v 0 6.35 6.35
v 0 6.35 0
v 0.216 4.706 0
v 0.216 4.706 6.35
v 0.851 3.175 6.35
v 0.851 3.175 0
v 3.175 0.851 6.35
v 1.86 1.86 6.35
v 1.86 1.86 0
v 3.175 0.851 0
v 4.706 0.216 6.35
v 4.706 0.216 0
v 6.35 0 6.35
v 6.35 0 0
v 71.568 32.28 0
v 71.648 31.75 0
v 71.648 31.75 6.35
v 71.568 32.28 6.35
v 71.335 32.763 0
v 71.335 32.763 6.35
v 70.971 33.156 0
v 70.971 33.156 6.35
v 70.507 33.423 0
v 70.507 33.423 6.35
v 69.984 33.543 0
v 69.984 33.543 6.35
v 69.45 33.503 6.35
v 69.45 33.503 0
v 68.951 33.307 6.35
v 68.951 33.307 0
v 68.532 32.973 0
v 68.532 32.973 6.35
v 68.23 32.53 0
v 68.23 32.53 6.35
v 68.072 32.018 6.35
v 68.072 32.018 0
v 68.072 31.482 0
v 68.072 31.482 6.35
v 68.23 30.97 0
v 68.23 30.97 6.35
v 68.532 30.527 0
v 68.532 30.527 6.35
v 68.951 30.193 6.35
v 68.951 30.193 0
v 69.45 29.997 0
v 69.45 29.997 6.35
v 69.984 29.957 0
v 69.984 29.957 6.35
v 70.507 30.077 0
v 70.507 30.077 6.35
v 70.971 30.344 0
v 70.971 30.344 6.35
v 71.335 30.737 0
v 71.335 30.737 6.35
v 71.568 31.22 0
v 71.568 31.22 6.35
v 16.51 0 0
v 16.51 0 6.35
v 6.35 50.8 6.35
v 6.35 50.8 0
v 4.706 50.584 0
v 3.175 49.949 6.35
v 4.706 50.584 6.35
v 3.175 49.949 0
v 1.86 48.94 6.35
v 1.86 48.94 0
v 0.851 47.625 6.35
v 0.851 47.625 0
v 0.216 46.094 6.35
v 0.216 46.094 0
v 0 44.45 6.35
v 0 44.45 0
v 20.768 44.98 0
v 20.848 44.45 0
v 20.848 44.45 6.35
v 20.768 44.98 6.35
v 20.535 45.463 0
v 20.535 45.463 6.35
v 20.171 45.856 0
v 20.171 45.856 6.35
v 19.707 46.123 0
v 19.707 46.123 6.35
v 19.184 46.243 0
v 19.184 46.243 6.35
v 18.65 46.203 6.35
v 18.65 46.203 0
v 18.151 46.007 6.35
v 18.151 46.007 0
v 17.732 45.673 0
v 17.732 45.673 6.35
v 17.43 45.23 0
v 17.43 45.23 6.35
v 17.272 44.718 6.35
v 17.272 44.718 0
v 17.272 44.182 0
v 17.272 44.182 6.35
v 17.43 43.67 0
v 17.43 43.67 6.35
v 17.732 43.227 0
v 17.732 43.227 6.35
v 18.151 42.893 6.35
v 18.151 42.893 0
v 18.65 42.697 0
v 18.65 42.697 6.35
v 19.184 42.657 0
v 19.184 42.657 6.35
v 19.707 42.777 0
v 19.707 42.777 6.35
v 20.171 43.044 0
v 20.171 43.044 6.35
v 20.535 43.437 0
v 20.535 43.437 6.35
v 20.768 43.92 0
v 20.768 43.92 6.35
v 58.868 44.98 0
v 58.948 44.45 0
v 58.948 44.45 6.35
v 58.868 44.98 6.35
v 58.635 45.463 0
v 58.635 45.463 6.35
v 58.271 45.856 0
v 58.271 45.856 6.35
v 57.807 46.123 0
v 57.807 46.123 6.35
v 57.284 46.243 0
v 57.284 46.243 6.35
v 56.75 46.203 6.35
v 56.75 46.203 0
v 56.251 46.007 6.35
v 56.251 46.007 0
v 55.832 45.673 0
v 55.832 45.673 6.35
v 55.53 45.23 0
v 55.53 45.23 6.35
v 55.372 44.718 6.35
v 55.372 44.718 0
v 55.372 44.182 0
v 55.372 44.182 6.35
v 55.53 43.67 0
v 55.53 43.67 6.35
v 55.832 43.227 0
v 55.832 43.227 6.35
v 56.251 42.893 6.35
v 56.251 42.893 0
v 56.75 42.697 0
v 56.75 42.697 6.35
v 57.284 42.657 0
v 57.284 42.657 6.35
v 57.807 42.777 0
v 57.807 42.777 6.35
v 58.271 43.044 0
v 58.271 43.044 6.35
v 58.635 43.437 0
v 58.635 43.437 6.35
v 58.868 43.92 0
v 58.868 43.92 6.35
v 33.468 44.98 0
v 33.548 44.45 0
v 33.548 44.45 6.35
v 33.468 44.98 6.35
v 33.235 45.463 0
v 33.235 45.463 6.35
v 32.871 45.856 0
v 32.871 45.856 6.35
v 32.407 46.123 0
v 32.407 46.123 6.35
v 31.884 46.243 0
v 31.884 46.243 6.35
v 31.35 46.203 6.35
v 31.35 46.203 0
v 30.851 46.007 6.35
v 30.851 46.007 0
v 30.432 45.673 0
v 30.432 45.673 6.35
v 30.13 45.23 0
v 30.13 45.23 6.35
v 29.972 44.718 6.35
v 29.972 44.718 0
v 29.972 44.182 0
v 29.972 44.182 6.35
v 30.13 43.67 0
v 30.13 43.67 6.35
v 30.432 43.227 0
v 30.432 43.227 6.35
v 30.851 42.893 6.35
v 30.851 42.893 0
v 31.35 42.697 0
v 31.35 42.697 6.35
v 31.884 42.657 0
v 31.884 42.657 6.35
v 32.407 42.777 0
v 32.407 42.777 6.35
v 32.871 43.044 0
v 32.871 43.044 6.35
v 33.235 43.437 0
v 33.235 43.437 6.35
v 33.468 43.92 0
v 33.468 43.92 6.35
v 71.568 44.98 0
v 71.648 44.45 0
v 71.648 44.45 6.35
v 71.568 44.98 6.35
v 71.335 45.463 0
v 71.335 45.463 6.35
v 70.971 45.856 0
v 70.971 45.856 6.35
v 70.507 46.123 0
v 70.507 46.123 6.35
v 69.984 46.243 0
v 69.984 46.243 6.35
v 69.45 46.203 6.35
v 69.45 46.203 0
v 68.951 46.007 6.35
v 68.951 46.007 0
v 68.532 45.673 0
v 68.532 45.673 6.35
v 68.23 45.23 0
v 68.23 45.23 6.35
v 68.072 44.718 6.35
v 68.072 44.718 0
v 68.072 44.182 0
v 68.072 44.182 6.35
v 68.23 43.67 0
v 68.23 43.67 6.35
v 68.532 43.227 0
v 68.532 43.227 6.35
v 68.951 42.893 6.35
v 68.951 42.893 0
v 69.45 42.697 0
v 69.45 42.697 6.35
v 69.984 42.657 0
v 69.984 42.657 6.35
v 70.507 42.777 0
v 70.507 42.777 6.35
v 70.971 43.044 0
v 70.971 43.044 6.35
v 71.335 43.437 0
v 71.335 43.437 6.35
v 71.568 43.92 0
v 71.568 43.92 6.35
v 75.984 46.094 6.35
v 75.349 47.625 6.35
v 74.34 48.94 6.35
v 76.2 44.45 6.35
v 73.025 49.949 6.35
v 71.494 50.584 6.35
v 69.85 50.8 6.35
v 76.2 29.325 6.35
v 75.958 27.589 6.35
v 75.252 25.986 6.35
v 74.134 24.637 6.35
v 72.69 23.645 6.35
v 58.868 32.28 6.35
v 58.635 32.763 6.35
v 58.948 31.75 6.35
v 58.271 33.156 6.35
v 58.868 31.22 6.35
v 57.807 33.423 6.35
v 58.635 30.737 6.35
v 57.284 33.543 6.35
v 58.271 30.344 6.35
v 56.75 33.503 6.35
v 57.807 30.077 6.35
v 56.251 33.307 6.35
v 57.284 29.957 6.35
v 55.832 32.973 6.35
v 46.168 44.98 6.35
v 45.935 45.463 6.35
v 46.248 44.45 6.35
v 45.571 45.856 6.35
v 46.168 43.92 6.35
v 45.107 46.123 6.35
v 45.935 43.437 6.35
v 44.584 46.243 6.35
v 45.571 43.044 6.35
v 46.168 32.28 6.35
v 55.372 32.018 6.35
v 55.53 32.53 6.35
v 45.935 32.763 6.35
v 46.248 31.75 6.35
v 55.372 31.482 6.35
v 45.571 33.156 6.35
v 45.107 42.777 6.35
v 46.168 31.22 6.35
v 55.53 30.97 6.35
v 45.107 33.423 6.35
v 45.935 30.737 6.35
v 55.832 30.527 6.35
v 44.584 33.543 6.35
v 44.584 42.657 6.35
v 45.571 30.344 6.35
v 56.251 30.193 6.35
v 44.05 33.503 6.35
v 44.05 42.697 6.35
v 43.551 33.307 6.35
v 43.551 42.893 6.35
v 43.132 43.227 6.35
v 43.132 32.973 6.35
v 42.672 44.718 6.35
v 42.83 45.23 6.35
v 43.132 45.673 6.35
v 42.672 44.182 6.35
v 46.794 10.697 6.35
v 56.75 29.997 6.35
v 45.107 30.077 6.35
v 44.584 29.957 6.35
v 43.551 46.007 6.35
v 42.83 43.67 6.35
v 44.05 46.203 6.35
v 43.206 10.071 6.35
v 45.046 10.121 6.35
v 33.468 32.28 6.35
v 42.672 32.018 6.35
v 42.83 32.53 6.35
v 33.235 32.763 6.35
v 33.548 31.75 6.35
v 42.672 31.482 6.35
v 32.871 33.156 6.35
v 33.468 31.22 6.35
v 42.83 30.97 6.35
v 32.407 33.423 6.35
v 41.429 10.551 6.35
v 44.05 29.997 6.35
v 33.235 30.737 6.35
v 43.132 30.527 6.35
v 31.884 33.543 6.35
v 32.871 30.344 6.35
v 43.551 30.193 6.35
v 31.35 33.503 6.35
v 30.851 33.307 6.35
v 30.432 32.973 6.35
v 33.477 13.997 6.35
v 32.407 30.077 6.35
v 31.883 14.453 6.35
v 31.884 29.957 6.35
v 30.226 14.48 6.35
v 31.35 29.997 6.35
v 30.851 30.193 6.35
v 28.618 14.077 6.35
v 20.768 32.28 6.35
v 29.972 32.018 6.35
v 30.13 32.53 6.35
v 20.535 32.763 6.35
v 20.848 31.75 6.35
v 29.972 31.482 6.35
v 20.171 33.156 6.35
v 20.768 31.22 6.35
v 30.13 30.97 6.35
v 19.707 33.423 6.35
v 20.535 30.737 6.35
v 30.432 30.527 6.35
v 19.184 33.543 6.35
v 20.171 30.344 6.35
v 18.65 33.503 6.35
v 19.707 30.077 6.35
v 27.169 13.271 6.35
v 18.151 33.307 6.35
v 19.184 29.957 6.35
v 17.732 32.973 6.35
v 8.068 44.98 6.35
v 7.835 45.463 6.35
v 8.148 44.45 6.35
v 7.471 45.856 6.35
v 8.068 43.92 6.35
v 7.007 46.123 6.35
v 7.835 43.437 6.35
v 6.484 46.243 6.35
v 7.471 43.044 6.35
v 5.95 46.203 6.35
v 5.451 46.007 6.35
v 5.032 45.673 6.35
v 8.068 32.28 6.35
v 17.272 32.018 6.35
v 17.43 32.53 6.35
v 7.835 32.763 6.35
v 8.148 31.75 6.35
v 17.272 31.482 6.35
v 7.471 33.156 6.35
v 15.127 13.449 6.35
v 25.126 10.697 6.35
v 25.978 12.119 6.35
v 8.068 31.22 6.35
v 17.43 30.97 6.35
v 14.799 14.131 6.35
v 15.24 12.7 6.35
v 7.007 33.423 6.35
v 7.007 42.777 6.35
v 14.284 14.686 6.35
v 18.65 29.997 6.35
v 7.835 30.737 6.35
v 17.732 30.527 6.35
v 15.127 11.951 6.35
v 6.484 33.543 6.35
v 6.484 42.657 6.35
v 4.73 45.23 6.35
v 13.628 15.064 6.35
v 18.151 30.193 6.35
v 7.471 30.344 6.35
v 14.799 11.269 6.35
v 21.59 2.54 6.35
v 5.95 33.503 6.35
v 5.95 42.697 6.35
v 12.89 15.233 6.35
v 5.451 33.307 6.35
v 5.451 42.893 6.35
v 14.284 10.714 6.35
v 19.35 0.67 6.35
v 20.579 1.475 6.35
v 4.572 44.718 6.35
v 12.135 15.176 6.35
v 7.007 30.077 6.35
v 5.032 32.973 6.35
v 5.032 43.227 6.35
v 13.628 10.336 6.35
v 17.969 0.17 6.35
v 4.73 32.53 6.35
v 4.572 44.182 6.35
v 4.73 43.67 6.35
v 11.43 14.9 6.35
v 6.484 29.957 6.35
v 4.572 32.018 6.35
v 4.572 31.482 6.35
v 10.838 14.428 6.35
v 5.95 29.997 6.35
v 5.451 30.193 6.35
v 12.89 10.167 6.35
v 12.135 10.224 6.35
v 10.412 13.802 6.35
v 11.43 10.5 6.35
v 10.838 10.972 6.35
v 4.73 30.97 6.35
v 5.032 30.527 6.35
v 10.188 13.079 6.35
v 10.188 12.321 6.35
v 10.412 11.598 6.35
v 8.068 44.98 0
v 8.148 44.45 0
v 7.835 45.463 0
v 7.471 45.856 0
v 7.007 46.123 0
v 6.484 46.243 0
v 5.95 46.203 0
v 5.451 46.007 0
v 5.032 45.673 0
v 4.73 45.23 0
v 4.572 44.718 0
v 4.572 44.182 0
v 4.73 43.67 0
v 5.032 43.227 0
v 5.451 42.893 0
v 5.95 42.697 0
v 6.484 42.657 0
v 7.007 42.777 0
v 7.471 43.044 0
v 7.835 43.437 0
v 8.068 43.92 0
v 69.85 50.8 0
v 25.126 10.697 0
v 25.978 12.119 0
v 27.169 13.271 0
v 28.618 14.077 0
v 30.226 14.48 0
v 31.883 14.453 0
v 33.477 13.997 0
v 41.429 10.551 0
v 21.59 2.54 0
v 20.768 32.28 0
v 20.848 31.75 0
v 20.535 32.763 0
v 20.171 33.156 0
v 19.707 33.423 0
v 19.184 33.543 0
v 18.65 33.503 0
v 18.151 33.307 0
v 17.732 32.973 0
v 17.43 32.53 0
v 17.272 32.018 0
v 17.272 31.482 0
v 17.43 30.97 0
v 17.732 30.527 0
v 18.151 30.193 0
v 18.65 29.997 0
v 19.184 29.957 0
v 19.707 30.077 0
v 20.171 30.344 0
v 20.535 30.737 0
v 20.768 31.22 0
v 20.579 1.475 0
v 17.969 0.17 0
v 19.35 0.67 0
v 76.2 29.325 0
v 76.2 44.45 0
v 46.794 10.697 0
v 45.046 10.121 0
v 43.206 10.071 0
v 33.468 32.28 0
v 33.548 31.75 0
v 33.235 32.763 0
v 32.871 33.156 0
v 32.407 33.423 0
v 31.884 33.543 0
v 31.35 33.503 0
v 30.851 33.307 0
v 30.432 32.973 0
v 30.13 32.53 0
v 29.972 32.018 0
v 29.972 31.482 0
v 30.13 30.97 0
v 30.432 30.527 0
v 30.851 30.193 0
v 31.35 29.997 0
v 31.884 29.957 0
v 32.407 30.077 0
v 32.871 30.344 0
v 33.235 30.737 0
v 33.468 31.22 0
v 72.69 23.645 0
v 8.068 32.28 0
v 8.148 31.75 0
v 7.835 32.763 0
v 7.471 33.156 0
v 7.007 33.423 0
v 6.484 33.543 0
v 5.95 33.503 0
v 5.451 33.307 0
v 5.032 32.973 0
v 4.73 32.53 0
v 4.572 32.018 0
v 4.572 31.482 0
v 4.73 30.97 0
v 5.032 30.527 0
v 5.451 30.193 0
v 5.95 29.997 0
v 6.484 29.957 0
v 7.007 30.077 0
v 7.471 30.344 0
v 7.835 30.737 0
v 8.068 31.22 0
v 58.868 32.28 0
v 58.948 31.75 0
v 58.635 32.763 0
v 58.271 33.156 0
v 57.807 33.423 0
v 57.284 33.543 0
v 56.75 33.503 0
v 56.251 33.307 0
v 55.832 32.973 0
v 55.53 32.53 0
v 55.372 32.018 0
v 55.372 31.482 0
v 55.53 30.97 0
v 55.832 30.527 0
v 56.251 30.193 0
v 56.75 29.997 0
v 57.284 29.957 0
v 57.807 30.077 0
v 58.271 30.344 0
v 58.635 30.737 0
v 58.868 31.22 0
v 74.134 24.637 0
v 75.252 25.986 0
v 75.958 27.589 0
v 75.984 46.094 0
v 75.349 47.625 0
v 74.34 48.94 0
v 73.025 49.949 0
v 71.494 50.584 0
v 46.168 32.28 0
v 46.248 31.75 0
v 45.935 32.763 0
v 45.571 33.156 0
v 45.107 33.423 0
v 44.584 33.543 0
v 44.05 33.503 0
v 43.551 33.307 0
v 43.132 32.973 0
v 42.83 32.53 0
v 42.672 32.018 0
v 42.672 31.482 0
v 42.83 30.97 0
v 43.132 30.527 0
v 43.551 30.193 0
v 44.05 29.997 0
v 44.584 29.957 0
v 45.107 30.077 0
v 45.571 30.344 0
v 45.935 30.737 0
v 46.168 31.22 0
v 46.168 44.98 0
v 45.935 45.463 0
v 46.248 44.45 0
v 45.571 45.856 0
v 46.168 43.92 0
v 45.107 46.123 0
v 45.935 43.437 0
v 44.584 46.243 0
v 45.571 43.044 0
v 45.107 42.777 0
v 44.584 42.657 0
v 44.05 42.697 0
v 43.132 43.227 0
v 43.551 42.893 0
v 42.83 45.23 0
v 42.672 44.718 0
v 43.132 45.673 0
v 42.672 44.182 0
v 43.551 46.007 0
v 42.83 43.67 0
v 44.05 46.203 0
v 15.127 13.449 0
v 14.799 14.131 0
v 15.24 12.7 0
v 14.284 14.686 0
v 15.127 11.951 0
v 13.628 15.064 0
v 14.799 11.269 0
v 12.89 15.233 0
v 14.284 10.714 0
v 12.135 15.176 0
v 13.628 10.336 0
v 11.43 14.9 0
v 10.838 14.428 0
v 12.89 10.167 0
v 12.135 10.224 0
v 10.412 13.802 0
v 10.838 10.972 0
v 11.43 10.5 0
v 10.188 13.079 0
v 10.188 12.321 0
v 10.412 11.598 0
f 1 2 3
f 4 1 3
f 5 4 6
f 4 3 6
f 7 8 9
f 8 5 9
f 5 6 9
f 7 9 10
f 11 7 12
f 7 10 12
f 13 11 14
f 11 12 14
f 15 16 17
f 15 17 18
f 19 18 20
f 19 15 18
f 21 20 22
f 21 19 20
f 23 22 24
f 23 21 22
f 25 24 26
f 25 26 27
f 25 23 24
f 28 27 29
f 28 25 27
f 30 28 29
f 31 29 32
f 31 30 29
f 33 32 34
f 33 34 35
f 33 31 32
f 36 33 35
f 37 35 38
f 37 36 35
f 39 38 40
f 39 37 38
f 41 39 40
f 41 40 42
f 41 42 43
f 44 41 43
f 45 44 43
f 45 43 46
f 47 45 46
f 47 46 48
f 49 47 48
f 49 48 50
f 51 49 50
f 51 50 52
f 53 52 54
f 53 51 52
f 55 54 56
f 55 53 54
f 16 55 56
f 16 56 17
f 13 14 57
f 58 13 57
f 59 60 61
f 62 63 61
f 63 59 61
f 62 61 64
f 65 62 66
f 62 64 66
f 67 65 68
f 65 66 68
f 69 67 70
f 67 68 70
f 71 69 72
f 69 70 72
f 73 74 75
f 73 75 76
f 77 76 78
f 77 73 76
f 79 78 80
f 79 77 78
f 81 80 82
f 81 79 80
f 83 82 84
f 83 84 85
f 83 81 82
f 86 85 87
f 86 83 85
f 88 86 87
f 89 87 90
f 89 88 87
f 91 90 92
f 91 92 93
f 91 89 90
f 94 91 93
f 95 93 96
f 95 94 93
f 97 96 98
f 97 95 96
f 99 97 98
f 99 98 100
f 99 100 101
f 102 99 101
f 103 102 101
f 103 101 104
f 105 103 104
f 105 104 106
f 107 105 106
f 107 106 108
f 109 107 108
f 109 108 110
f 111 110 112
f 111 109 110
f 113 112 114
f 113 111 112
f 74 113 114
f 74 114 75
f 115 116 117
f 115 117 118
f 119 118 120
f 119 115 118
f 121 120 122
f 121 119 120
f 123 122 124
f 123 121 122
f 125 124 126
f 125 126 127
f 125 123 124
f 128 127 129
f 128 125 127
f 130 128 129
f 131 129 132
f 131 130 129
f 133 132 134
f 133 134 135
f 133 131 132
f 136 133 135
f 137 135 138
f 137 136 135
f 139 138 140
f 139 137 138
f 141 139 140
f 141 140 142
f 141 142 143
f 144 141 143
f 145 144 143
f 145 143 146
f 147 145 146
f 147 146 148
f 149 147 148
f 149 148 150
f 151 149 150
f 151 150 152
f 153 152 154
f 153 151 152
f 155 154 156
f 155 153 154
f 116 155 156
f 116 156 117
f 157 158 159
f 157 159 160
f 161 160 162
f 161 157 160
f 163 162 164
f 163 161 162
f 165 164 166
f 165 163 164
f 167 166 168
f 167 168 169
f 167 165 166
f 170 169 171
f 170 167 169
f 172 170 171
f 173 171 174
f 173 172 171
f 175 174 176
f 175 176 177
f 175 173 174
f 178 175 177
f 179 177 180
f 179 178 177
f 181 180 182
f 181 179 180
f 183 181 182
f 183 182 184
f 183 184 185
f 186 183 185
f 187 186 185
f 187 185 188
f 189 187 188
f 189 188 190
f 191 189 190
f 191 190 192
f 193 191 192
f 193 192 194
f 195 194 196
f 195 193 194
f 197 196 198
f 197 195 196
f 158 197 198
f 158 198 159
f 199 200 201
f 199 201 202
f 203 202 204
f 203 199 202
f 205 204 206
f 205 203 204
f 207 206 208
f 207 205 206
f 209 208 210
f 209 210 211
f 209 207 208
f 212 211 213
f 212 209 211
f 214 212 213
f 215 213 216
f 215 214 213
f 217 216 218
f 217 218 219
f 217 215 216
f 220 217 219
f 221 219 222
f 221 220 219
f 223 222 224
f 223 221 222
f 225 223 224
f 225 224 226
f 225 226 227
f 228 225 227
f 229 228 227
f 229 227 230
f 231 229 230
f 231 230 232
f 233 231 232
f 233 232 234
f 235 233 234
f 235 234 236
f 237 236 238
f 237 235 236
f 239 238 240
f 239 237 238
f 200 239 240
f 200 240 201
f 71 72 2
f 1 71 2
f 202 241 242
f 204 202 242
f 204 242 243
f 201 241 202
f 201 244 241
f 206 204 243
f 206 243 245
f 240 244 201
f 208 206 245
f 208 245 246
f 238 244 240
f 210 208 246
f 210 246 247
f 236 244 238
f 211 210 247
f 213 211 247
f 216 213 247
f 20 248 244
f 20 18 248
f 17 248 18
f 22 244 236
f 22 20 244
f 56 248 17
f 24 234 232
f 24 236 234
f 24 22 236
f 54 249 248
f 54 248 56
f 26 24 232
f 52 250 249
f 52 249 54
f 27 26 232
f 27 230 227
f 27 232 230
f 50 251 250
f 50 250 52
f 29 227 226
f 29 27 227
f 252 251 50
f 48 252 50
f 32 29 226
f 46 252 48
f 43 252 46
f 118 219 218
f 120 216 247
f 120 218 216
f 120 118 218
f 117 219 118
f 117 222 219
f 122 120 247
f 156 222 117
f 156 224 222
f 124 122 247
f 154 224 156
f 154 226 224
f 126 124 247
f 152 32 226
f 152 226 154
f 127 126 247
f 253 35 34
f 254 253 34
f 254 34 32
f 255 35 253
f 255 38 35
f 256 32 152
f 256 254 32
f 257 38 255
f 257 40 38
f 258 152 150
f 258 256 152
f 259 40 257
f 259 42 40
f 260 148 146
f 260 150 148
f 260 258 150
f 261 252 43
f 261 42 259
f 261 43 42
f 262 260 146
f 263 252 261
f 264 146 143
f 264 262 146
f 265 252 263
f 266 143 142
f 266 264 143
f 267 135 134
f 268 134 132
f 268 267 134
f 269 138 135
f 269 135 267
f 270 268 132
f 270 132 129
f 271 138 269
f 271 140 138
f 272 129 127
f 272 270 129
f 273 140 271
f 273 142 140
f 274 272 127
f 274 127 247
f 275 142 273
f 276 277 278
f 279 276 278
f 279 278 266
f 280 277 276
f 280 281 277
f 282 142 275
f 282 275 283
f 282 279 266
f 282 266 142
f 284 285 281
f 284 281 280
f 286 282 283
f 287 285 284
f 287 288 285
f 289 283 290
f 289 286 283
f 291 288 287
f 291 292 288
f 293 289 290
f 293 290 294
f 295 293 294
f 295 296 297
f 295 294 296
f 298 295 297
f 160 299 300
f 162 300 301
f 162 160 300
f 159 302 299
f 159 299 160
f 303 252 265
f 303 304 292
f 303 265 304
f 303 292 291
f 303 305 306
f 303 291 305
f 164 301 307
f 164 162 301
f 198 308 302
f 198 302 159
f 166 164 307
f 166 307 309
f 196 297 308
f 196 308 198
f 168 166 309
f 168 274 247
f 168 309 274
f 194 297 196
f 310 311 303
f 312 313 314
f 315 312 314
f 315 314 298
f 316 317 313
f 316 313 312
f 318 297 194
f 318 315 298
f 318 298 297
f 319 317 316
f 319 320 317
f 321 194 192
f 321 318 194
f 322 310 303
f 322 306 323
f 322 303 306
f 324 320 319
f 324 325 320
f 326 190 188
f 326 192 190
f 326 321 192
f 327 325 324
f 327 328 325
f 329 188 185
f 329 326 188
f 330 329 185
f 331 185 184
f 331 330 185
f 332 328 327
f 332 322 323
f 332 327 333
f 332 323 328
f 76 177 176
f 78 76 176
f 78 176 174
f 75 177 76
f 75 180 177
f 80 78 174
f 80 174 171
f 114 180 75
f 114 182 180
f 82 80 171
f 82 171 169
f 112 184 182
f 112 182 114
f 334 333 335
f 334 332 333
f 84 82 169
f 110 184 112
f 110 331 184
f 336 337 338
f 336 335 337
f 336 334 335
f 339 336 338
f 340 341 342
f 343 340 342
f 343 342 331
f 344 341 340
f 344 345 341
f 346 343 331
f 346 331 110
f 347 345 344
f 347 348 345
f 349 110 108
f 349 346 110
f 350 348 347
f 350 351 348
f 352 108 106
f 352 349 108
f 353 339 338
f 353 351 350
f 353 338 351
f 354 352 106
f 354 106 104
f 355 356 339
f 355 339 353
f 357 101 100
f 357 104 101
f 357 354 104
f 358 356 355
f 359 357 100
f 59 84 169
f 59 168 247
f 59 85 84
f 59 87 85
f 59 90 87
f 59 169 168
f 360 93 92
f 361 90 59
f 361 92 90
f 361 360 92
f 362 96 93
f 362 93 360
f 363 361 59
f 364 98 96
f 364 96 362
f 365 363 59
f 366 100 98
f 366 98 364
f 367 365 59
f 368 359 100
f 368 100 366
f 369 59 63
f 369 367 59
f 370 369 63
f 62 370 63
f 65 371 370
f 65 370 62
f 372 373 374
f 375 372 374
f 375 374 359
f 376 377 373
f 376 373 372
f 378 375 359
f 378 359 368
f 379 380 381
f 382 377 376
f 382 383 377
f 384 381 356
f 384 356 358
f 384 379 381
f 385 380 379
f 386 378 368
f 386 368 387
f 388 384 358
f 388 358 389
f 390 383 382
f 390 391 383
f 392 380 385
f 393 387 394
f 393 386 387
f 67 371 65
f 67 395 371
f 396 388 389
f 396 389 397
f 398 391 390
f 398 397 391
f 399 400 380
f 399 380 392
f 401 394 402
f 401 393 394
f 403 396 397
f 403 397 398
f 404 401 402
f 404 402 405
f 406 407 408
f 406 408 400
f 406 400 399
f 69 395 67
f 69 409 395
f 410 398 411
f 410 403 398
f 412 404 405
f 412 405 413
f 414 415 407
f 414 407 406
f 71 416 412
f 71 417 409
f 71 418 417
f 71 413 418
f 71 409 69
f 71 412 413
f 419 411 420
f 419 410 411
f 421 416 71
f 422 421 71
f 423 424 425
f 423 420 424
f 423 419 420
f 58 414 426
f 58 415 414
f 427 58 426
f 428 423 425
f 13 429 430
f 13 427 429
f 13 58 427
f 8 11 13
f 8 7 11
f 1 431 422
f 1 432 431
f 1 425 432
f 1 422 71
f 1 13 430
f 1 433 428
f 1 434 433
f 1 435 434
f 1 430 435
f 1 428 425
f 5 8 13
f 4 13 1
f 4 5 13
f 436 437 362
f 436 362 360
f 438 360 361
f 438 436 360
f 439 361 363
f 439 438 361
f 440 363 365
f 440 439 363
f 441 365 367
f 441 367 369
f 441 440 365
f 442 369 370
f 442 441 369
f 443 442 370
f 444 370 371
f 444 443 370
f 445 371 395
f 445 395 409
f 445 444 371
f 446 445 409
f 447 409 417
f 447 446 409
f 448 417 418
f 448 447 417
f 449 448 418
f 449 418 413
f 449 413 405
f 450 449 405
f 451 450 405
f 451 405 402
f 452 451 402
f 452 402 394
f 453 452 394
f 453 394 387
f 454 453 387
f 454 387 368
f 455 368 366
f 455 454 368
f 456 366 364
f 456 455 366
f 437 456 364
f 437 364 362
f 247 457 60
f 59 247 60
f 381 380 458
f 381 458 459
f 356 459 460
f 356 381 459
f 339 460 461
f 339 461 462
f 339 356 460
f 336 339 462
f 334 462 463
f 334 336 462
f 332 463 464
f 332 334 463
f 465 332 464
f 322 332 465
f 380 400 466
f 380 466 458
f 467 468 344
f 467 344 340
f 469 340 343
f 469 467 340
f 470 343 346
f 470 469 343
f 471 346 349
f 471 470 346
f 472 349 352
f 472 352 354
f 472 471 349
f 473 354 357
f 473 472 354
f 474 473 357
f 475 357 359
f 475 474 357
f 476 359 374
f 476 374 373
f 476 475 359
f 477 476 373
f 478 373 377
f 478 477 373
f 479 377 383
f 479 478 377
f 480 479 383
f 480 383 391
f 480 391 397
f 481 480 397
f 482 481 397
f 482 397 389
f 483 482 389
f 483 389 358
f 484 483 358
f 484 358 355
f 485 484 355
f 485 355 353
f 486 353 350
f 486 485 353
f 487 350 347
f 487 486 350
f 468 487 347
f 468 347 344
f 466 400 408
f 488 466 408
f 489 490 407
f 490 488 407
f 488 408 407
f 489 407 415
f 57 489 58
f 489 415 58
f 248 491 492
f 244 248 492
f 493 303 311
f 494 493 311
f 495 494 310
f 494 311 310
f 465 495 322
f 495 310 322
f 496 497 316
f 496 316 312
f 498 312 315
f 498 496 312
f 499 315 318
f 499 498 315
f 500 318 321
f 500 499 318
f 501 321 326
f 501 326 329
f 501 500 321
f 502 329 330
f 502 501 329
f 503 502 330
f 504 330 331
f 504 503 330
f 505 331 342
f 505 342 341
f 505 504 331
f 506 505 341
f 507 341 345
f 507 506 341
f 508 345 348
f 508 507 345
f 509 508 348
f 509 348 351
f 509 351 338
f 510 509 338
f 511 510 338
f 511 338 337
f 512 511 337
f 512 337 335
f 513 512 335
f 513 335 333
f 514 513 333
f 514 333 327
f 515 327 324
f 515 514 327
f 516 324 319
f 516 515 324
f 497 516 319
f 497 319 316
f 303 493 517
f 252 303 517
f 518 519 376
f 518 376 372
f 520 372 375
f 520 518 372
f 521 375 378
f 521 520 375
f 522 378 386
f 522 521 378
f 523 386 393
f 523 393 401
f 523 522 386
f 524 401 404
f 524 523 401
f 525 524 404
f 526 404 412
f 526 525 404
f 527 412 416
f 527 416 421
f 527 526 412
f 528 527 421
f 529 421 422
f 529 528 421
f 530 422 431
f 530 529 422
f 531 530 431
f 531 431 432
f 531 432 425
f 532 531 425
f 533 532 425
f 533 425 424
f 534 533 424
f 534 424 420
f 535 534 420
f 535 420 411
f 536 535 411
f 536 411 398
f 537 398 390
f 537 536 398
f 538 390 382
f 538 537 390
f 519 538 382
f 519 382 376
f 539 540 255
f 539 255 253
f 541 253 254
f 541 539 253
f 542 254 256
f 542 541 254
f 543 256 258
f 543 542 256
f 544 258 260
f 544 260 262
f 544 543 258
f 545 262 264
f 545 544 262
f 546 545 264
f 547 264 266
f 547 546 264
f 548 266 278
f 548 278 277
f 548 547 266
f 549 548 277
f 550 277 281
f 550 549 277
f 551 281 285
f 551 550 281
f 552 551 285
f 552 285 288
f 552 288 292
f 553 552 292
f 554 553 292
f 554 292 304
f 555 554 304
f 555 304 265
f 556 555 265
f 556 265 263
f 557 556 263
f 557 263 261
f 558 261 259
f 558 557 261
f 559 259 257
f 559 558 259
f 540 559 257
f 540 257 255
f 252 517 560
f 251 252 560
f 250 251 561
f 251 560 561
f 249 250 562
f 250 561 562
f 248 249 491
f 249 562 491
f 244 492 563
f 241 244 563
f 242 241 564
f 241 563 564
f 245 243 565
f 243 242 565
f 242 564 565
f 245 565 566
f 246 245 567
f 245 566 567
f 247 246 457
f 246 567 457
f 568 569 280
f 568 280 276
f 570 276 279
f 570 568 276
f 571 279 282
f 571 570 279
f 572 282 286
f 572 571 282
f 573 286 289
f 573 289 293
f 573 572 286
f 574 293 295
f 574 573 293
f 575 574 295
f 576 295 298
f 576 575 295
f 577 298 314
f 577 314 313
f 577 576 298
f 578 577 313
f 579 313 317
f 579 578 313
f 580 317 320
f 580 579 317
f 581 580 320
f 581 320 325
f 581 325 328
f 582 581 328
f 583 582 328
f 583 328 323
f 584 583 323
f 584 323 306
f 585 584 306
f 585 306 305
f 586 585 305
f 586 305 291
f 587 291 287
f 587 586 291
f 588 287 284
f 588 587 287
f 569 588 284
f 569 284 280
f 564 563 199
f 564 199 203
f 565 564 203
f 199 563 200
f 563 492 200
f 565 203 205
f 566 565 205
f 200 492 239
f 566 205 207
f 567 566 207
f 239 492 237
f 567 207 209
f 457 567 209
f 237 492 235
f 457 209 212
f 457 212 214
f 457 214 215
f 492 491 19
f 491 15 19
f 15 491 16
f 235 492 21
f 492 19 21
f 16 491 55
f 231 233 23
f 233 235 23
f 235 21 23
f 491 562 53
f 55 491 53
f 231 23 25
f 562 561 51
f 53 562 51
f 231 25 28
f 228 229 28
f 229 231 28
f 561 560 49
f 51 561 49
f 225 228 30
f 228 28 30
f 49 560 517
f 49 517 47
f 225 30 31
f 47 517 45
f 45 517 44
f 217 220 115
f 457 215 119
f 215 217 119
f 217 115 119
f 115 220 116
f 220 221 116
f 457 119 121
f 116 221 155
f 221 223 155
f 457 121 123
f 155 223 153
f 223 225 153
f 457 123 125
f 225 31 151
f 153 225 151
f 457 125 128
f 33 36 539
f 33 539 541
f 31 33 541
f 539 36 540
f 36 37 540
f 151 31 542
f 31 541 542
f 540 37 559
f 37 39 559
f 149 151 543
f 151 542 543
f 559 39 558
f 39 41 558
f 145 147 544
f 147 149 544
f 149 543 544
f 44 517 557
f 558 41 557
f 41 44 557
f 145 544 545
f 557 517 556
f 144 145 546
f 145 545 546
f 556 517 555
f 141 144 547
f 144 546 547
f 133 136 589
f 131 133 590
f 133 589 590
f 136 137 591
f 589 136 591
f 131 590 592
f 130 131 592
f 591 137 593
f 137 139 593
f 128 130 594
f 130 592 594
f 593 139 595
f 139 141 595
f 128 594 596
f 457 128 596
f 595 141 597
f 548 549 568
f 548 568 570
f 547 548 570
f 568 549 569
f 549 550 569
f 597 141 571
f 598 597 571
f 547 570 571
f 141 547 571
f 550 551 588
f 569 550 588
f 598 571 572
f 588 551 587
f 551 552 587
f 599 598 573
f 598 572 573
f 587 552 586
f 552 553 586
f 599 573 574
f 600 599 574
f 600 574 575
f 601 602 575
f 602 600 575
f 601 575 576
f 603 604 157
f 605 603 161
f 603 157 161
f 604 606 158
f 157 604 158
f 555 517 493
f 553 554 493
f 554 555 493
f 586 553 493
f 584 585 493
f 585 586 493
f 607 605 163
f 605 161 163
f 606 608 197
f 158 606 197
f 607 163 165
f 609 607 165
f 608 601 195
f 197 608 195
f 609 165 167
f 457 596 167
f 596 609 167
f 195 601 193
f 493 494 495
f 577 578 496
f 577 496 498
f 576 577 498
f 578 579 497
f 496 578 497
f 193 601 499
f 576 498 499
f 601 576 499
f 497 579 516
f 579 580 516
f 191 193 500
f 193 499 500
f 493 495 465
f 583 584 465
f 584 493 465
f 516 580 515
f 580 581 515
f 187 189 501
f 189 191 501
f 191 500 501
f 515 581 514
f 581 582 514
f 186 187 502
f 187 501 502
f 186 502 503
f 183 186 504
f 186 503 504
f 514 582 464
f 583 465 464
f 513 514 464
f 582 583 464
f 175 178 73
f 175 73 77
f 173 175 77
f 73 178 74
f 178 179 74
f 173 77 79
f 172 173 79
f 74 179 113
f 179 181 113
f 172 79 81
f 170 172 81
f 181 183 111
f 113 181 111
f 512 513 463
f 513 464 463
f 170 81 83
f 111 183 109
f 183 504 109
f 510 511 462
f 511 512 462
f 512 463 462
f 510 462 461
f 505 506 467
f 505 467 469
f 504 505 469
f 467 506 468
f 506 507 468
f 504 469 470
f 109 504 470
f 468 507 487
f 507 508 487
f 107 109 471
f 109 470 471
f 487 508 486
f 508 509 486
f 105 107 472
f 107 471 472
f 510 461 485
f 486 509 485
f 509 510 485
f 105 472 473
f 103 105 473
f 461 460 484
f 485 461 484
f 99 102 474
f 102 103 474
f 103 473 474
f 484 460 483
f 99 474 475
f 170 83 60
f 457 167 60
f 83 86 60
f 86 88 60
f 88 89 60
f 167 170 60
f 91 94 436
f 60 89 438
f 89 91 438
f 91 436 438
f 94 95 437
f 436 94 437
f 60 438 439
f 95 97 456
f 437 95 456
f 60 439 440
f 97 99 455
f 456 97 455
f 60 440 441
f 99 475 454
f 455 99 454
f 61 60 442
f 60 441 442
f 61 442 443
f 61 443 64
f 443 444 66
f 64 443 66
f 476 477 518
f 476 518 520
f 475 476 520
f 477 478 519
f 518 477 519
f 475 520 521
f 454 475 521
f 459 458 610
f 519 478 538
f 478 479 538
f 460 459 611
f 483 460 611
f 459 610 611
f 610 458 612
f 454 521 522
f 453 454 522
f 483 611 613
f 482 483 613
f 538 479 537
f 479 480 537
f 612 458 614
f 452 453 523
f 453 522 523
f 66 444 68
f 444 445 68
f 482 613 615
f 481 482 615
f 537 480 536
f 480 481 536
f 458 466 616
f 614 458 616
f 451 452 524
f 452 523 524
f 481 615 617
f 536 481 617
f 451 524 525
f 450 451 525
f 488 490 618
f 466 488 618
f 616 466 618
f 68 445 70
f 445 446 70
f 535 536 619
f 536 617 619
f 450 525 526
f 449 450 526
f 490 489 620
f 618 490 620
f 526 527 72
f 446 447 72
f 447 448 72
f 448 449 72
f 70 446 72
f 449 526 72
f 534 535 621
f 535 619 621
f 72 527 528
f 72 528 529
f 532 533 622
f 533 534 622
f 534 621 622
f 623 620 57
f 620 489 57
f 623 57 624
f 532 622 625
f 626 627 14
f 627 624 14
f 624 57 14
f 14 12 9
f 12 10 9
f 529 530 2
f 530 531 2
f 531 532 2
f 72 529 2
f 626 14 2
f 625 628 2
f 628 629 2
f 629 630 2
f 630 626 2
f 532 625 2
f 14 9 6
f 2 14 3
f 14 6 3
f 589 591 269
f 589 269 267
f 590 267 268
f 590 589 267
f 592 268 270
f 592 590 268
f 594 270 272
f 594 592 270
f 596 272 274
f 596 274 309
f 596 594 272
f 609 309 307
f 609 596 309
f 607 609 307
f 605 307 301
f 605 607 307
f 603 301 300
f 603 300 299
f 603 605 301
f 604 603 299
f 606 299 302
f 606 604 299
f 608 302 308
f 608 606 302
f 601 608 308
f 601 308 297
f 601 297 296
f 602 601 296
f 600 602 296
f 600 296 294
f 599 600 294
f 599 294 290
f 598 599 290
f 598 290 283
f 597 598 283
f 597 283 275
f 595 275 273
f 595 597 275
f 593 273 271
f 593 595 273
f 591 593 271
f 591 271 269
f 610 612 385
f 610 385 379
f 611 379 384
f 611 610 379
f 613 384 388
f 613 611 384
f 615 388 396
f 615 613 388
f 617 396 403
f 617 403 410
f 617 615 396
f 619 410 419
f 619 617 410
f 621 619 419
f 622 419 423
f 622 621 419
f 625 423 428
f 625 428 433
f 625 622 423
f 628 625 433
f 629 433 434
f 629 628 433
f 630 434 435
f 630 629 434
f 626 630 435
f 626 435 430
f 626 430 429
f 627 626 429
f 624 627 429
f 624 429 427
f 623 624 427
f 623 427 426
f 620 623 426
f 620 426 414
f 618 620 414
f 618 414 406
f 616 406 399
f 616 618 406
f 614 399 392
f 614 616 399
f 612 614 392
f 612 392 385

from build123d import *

# Parameters (mm, degrees)
SKETCH1_R           = 2.54
SKETCH1_R_2         = 1.797730585
BOSS_EXTRUDE1_DEPTH = 6.35
CUT_EXTRUDE1_DEPTH  = 92.800885072
FILLET1_R           = 6.35


with BuildPart() as part:
    # Sketch1 → Boss-Extrude1 (new body)
    with BuildSketch(Plane.XY):
        Polygon((25.4, 0), (76.2, 25.4), (76.2, 50.8), (0, 50.8), (0, 0), align=None)
        with Locations((12.7, 12.7)):
            Circle(SKETCH1_R, mode=Mode.SUBTRACT)
        with Locations((69.85, 44.45)):
            Circle(SKETCH1_R_2, mode=Mode.SUBTRACT)
        with Locations((57.15, 44.45)):
            Circle(SKETCH1_R_2, mode=Mode.SUBTRACT)
        with Locations((44.45, 44.45)):
            Circle(SKETCH1_R_2, mode=Mode.SUBTRACT)
        with Locations((31.75, 44.45)):
            Circle(SKETCH1_R_2, mode=Mode.SUBTRACT)
        with Locations((19.05, 44.45)):
            Circle(SKETCH1_R_2, mode=Mode.SUBTRACT)
        with Locations((6.35, 44.45)):
            Circle(SKETCH1_R_2, mode=Mode.SUBTRACT)
        with Locations((57.15, 31.75)):
            Circle(SKETCH1_R_2, mode=Mode.SUBTRACT)
        with Locations((44.45, 31.75)):
            Circle(SKETCH1_R_2, mode=Mode.SUBTRACT)
        with Locations((31.75, 31.75)):
            Circle(SKETCH1_R_2, mode=Mode.SUBTRACT)
        with Locations((19.05, 31.75)):
            Circle(SKETCH1_R_2, mode=Mode.SUBTRACT)
        with Locations((6.35, 31.75)):
            Circle(SKETCH1_R_2, mode=Mode.SUBTRACT)
        with Locations((69.85, 31.75)):
            Circle(SKETCH1_R_2, mode=Mode.SUBTRACT)
    extrude(amount=BOSS_EXTRUDE1_DEPTH)

    # Sketch2 → Cut-Extrude1 (cut, through all)
    with BuildSketch(Plane.XY.offset(6.35)):
        Polygon((21.59, 0), (21.59, 2.54), (27.65106415, 16.522886017), (44.145936938, 9.372968469), (25.4, 0), align=None)
    extrude(amount=-CUT_EXTRUDE1_DEPTH, mode=Mode.SUBTRACT)

    # Fillet1
    # the kernel refuses this fillet: 6.35 mm, written as the material it adds along each edge
    with BuildSketch(Plane(origin=(27.65106415, 16.522886017, 6.35), x_dir=(0.9175122058614823, -0.397707621369263, 0), z_dir=(0, 0, -1))) as fillet1_piece_1:
        with BuildLine():
            CenterArc((FILLET1_R, FILLET1_R), FILLET1_R, 180, 90)
            Line((0, FILLET1_R), (0, 0))
            Line((0, 0), (FILLET1_R, 0))
        make_face()
    extrude(amount=6.35)
    # the kernel refuses this fillet: 6.35 mm, written as the material it takes off along each edge
    with BuildSketch(Plane(origin=(44.145936938, 9.372968469, 13.752634073), x_dir=(0.8944271909999154, 0.4472135954999589, 0), z_dir=(0, 0, -1))) as fillet1_2_piece_1:
        with BuildLine():
            CenterArc((FILLET1_R * 0.466307658155, -FILLET1_R), FILLET1_R, 90, 50)
            Line((-FILLET1_R * 0.299736784964, -FILLET1_R * 0.357212390313), (0, 0))
            Line((0, 0), (FILLET1_R * 0.466307658155, 0))
        make_face()
    extrude(amount=21.155268146, mode=Mode.SUBTRACT)
    with BuildSketch(Plane(origin=(76.2, 25.4, -9.811289571), x_dir=(-0.8944271909999166, -0.4472135954999565, 0), z_dir=(0, 0, 1))) as fillet1_2_piece_2:
        with BuildLine():
            CenterArc((FILLET1_R * 0.61803398875, -FILLET1_R), FILLET1_R, 90, 63.434948823)
            Line((-FILLET1_R * 0.27639320225, -FILLET1_R * 0.5527864045), (0, 0))
            Line((0, 0), (FILLET1_R * 0.61803398875, 0))
        make_face()
    extrude(amount=25.972579143, mode=Mode.SUBTRACT)
    with BuildSketch(Plane(origin=(76.2, 50.8, -15.875), x_dir=(0, -1, 0), z_dir=(0, 0, 1))) as fillet1_2_piece_3:
        with BuildLine():
            CenterArc((FILLET1_R, -FILLET1_R), FILLET1_R, 90, 90)
            Line((0, -FILLET1_R), (0, 0))
            Line((0, 0), (FILLET1_R, 0))
        make_face()
    extrude(amount=38.1, mode=Mode.SUBTRACT)
    with BuildSketch(Plane(origin=(0, 50.8, -15.875), x_dir=(0, -1, 0), z_dir=(0, 0, 1)), Plane(origin=(0, 0, -15.875), x_dir=(1, 0, 0), z_dir=(0, 0, 1))) as fillet1_2_piece_4:
        with BuildLine():
            CenterArc((FILLET1_R, FILLET1_R), FILLET1_R, 180, 90)
            Line((0, FILLET1_R), (0, 0))
            Line((0, 0), (FILLET1_R, 0))
        make_face()
    extrude(amount=38.1, mode=Mode.SUBTRACT)
    with BuildSketch(Plane(origin=(21.59, 0, 19.05), x_dir=(0, 1, 0), z_dir=(0, 0, -1))) as fillet1_2_piece_5:
        with BuildLine():
            CenterArc((6.35, -5.08), FILLET1_R, 126.869897646, 53.130102354)
            Line((0, -5.08), (0, 0))
            Line((0, 0), (2.54, 0))
        make_face()
    extrude(amount=31.75, mode=Mode.SUBTRACT)


solid = part.part
